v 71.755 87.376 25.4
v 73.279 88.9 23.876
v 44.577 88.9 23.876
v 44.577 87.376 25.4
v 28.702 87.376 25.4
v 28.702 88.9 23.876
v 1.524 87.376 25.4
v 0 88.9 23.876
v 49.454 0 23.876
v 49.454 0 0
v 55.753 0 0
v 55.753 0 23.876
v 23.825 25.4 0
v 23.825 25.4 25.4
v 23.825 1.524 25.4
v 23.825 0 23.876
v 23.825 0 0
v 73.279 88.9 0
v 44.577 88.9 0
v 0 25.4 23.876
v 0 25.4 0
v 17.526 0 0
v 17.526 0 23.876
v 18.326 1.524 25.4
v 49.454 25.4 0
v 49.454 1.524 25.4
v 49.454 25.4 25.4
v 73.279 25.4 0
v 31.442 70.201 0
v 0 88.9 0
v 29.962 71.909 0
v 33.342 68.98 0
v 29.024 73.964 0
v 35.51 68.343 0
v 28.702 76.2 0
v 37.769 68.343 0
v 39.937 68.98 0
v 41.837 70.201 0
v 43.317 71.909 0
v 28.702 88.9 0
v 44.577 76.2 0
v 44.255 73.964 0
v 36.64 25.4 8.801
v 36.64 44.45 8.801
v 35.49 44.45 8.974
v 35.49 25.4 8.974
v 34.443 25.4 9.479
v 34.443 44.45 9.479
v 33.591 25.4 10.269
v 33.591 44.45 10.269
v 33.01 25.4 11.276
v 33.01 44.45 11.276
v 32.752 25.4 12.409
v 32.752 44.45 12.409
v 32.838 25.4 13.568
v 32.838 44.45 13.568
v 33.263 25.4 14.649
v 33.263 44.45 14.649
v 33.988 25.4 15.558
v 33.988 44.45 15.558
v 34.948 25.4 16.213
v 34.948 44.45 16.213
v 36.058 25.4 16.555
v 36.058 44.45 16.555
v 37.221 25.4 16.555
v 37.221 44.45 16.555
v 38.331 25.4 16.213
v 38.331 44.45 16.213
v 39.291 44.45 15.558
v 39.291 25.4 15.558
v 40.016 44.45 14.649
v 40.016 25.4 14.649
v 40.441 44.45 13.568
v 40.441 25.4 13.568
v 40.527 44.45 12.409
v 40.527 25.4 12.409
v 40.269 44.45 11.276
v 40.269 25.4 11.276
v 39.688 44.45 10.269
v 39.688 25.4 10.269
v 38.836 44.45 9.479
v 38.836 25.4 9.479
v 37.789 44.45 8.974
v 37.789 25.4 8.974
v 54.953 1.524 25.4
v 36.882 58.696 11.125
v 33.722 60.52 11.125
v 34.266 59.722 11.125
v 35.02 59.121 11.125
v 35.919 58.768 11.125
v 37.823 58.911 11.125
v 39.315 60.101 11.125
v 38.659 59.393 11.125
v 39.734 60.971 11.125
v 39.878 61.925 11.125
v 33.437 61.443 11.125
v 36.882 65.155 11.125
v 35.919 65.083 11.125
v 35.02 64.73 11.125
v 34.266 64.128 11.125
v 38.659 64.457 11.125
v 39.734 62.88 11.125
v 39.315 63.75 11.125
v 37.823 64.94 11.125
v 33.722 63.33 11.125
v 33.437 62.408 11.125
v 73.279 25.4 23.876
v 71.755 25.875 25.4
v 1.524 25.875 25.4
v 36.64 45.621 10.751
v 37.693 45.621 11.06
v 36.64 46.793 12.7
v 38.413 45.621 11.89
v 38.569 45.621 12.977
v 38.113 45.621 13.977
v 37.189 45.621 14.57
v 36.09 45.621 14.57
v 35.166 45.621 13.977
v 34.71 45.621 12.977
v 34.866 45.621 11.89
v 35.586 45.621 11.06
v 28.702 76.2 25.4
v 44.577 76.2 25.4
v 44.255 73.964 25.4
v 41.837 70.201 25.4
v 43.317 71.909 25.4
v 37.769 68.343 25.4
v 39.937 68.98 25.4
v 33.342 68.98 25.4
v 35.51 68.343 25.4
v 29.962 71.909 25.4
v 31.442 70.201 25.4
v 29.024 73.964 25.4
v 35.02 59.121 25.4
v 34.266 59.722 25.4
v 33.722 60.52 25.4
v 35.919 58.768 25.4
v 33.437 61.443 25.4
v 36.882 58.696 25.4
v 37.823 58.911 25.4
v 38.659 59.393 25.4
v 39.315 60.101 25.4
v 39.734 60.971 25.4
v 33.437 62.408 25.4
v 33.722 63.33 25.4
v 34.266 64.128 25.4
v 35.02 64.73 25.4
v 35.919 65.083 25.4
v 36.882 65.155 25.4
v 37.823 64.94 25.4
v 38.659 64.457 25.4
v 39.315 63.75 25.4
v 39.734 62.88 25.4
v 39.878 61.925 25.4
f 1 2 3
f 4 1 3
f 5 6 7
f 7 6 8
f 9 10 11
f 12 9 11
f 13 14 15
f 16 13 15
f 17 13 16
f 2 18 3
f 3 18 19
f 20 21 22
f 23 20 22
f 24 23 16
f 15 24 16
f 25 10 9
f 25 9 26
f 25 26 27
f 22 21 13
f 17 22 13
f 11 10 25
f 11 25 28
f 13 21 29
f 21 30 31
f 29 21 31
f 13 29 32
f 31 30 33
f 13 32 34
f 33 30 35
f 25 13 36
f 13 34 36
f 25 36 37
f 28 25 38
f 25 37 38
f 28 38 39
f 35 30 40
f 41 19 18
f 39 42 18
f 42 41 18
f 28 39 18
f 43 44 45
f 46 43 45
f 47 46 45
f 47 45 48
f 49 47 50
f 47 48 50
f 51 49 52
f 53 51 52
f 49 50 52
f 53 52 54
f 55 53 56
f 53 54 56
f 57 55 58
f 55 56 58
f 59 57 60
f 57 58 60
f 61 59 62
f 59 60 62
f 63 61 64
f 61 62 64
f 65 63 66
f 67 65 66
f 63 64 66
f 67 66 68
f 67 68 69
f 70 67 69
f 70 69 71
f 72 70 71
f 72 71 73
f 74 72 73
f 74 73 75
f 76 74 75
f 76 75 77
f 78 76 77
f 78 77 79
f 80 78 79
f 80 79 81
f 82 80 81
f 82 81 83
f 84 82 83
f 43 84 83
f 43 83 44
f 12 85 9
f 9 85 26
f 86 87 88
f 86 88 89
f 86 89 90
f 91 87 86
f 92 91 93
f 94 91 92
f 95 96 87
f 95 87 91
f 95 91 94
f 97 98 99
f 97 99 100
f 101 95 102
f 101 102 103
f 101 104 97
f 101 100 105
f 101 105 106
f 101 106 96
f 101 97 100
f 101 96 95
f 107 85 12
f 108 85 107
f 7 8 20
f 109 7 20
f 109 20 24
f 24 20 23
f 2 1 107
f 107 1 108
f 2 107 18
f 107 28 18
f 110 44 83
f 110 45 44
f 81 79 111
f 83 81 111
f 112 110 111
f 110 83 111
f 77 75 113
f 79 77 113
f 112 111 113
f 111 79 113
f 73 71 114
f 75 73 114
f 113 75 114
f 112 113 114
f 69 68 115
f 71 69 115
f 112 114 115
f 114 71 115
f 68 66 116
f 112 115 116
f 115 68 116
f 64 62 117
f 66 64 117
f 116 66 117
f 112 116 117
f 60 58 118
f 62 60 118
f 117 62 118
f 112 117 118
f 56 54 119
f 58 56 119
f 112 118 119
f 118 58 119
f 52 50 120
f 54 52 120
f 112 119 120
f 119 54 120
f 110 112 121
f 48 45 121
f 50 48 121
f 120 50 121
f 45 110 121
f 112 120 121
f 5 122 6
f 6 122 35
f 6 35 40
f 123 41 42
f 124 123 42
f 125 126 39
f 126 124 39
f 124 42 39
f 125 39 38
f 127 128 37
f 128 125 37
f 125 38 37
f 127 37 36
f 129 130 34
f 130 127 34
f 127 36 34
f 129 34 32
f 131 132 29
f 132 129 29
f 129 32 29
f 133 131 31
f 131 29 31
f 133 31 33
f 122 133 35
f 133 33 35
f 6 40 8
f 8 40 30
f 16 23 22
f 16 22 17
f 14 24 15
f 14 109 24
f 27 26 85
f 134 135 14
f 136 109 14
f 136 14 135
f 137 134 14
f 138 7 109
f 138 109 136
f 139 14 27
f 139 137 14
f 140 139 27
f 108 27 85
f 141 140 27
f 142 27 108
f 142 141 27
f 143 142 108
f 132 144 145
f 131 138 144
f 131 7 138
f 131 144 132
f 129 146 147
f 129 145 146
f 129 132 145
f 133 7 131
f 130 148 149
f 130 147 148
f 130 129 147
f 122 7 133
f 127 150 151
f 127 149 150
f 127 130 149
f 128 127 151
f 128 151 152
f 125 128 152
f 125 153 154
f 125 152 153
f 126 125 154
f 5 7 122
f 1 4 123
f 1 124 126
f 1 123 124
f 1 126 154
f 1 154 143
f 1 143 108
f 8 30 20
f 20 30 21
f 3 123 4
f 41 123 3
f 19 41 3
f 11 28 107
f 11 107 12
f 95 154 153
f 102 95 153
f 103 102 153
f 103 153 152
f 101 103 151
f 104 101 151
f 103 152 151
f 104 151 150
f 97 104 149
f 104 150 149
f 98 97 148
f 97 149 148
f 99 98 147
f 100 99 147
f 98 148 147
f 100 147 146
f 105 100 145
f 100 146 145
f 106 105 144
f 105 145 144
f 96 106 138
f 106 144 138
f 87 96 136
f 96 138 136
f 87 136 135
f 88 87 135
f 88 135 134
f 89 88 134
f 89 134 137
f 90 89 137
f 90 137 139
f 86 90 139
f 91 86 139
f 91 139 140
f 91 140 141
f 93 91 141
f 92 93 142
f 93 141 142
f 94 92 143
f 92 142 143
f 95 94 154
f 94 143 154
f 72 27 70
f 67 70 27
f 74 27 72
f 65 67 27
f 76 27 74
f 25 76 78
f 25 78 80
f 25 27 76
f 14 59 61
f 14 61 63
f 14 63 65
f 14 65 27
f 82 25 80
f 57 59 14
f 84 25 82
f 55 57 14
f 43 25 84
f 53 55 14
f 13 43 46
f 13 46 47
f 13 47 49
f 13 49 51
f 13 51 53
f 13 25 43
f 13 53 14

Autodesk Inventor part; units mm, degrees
ref_plane "YZ Plane" through (0, 0, 0) normal (1, 0, 0) x (0, 1, 0)
ref_plane "XZ Plane" through (0, 0, 0) normal (0, 1, 0) x (-1, 0, 0)
ref_plane "XY Plane" through (0, 0, 0) normal (0, 0, 1) x (1, 0, 0)
sketch "Sketch1" plane through (0, 0, 0) normal (0, 0, 1) x (1, 0, 0)
  line L0 (73.279, 0) -> (73.279, 88.9)
  line L1 (0, 88.9) -> (0, 0)
  arc A0 (28.702, 76.2) -> (44.577, 76.2) centre (36.6395, 76.2) ccw
  line L2 (28.702, 76.2) -> (28.702, 88.9)
  line L3 (44.577, 76.2) -> (44.577, 88.9)
  line L4 (73.279, 88.9) -> (44.577, 88.9)
  line L5 (28.702, 88.9) -> (0, 88.9)
  line L6 (23.8252, 0) -> (49.4538, 0)
  line L7 (49.4538, 0) -> (49.4538, 25.4)
  line L8 (49.4538, 25.4) -> (23.8252, 25.4)
  line L9 (23.8252, 25.4) -> (23.8252, 0)
  line L10 (0, 25.4) -> (17.526, 0)
  line L11 (73.279, 25.4) -> (55.753, 0)
  line L12 (0, 0) -> (23.8252, 0)
  line L13 (49.4538, 0) -> (73.279, 0)
  dimension "d0" = 73.279
  dimension "d1" = 88.9
  dimension "d2" = 15.875
  dimension "d4" = 25.6286
  dimension "d5" = 63.5
  dimension "d6" = 23.8252
  dimension "d7" = 17.526
  dimension "d8" = 17.526
extrude "Extrusion1" add sketch "Sketch1" along normal blind 25.4 contours L11 L13 L7 L8 L9 L12 L10 L1 L5 L2 A0 L3 L4 L0
sketch "Sketch2" plane through (0, 0, 25.4) normal (0, 0, 1) x (1, 0, 0)
  circle A0 centre (36.6395, 61.9252) radius 3.2385
  line L0 (73.279, 25.4) -> (73.279, 88.9) projected
  line L1 (0, 88.9) -> (0, 25.4) projected
  line L2 (73.279, 88.9) -> (44.577, 88.9) projected
  point P0 (0, 0)
  dimension "d12" = 73.279
  dimension "d13" = 36.6395
  dimension "d14" = 6.477
  dimension "d15" = 26.9748
extrude "Extrusion2" cut sketch "Sketch2" against normal blind 14.2748
sketch "Sketch3" plane through (23.8252, 25.4, 0) normal (0, -1, 0) x (1, 0, 0)
  line L0 (0, 25.4) -> (25.6286, 25.4) projected
  line L1 (25.6286, 0) -> (25.6286, 25.4) projected
  point P0 (-23.8252, 0)
  point P1 (12.8143, 12.7)
  dimension "d18" = 12.7
  dimension "d19" = 12.8143
  dimension "d20" = 25.6286
hole "Hole1" at (36.6395, 25.4, 12.7) direction (0, 1, 0) diameter 7.7978 depth 19.05 tip angle 118 thread size "3/8-16 UNC" class "2B" standard "ANSI Unified Screw Threads"
chamfer "Chamfer1" distance 1.524 angle 45 8 edges at (14.351, 88.9, 25.4) (0, 57.15, 25.4) (8.763, 12.7, 25.4) (20.6756, 0, 25.4) (52.6034, 0, 25.4) (64.516, 12.7, 25.4) (73.279, 57.15, 25.4) (58.928, 88.9, 25.4)
equation "\"d13\" = 0.5 * d12"
equation "\"d19\" = 0.5 * d20"
properties part number "Base" material "Stainless Steel"
